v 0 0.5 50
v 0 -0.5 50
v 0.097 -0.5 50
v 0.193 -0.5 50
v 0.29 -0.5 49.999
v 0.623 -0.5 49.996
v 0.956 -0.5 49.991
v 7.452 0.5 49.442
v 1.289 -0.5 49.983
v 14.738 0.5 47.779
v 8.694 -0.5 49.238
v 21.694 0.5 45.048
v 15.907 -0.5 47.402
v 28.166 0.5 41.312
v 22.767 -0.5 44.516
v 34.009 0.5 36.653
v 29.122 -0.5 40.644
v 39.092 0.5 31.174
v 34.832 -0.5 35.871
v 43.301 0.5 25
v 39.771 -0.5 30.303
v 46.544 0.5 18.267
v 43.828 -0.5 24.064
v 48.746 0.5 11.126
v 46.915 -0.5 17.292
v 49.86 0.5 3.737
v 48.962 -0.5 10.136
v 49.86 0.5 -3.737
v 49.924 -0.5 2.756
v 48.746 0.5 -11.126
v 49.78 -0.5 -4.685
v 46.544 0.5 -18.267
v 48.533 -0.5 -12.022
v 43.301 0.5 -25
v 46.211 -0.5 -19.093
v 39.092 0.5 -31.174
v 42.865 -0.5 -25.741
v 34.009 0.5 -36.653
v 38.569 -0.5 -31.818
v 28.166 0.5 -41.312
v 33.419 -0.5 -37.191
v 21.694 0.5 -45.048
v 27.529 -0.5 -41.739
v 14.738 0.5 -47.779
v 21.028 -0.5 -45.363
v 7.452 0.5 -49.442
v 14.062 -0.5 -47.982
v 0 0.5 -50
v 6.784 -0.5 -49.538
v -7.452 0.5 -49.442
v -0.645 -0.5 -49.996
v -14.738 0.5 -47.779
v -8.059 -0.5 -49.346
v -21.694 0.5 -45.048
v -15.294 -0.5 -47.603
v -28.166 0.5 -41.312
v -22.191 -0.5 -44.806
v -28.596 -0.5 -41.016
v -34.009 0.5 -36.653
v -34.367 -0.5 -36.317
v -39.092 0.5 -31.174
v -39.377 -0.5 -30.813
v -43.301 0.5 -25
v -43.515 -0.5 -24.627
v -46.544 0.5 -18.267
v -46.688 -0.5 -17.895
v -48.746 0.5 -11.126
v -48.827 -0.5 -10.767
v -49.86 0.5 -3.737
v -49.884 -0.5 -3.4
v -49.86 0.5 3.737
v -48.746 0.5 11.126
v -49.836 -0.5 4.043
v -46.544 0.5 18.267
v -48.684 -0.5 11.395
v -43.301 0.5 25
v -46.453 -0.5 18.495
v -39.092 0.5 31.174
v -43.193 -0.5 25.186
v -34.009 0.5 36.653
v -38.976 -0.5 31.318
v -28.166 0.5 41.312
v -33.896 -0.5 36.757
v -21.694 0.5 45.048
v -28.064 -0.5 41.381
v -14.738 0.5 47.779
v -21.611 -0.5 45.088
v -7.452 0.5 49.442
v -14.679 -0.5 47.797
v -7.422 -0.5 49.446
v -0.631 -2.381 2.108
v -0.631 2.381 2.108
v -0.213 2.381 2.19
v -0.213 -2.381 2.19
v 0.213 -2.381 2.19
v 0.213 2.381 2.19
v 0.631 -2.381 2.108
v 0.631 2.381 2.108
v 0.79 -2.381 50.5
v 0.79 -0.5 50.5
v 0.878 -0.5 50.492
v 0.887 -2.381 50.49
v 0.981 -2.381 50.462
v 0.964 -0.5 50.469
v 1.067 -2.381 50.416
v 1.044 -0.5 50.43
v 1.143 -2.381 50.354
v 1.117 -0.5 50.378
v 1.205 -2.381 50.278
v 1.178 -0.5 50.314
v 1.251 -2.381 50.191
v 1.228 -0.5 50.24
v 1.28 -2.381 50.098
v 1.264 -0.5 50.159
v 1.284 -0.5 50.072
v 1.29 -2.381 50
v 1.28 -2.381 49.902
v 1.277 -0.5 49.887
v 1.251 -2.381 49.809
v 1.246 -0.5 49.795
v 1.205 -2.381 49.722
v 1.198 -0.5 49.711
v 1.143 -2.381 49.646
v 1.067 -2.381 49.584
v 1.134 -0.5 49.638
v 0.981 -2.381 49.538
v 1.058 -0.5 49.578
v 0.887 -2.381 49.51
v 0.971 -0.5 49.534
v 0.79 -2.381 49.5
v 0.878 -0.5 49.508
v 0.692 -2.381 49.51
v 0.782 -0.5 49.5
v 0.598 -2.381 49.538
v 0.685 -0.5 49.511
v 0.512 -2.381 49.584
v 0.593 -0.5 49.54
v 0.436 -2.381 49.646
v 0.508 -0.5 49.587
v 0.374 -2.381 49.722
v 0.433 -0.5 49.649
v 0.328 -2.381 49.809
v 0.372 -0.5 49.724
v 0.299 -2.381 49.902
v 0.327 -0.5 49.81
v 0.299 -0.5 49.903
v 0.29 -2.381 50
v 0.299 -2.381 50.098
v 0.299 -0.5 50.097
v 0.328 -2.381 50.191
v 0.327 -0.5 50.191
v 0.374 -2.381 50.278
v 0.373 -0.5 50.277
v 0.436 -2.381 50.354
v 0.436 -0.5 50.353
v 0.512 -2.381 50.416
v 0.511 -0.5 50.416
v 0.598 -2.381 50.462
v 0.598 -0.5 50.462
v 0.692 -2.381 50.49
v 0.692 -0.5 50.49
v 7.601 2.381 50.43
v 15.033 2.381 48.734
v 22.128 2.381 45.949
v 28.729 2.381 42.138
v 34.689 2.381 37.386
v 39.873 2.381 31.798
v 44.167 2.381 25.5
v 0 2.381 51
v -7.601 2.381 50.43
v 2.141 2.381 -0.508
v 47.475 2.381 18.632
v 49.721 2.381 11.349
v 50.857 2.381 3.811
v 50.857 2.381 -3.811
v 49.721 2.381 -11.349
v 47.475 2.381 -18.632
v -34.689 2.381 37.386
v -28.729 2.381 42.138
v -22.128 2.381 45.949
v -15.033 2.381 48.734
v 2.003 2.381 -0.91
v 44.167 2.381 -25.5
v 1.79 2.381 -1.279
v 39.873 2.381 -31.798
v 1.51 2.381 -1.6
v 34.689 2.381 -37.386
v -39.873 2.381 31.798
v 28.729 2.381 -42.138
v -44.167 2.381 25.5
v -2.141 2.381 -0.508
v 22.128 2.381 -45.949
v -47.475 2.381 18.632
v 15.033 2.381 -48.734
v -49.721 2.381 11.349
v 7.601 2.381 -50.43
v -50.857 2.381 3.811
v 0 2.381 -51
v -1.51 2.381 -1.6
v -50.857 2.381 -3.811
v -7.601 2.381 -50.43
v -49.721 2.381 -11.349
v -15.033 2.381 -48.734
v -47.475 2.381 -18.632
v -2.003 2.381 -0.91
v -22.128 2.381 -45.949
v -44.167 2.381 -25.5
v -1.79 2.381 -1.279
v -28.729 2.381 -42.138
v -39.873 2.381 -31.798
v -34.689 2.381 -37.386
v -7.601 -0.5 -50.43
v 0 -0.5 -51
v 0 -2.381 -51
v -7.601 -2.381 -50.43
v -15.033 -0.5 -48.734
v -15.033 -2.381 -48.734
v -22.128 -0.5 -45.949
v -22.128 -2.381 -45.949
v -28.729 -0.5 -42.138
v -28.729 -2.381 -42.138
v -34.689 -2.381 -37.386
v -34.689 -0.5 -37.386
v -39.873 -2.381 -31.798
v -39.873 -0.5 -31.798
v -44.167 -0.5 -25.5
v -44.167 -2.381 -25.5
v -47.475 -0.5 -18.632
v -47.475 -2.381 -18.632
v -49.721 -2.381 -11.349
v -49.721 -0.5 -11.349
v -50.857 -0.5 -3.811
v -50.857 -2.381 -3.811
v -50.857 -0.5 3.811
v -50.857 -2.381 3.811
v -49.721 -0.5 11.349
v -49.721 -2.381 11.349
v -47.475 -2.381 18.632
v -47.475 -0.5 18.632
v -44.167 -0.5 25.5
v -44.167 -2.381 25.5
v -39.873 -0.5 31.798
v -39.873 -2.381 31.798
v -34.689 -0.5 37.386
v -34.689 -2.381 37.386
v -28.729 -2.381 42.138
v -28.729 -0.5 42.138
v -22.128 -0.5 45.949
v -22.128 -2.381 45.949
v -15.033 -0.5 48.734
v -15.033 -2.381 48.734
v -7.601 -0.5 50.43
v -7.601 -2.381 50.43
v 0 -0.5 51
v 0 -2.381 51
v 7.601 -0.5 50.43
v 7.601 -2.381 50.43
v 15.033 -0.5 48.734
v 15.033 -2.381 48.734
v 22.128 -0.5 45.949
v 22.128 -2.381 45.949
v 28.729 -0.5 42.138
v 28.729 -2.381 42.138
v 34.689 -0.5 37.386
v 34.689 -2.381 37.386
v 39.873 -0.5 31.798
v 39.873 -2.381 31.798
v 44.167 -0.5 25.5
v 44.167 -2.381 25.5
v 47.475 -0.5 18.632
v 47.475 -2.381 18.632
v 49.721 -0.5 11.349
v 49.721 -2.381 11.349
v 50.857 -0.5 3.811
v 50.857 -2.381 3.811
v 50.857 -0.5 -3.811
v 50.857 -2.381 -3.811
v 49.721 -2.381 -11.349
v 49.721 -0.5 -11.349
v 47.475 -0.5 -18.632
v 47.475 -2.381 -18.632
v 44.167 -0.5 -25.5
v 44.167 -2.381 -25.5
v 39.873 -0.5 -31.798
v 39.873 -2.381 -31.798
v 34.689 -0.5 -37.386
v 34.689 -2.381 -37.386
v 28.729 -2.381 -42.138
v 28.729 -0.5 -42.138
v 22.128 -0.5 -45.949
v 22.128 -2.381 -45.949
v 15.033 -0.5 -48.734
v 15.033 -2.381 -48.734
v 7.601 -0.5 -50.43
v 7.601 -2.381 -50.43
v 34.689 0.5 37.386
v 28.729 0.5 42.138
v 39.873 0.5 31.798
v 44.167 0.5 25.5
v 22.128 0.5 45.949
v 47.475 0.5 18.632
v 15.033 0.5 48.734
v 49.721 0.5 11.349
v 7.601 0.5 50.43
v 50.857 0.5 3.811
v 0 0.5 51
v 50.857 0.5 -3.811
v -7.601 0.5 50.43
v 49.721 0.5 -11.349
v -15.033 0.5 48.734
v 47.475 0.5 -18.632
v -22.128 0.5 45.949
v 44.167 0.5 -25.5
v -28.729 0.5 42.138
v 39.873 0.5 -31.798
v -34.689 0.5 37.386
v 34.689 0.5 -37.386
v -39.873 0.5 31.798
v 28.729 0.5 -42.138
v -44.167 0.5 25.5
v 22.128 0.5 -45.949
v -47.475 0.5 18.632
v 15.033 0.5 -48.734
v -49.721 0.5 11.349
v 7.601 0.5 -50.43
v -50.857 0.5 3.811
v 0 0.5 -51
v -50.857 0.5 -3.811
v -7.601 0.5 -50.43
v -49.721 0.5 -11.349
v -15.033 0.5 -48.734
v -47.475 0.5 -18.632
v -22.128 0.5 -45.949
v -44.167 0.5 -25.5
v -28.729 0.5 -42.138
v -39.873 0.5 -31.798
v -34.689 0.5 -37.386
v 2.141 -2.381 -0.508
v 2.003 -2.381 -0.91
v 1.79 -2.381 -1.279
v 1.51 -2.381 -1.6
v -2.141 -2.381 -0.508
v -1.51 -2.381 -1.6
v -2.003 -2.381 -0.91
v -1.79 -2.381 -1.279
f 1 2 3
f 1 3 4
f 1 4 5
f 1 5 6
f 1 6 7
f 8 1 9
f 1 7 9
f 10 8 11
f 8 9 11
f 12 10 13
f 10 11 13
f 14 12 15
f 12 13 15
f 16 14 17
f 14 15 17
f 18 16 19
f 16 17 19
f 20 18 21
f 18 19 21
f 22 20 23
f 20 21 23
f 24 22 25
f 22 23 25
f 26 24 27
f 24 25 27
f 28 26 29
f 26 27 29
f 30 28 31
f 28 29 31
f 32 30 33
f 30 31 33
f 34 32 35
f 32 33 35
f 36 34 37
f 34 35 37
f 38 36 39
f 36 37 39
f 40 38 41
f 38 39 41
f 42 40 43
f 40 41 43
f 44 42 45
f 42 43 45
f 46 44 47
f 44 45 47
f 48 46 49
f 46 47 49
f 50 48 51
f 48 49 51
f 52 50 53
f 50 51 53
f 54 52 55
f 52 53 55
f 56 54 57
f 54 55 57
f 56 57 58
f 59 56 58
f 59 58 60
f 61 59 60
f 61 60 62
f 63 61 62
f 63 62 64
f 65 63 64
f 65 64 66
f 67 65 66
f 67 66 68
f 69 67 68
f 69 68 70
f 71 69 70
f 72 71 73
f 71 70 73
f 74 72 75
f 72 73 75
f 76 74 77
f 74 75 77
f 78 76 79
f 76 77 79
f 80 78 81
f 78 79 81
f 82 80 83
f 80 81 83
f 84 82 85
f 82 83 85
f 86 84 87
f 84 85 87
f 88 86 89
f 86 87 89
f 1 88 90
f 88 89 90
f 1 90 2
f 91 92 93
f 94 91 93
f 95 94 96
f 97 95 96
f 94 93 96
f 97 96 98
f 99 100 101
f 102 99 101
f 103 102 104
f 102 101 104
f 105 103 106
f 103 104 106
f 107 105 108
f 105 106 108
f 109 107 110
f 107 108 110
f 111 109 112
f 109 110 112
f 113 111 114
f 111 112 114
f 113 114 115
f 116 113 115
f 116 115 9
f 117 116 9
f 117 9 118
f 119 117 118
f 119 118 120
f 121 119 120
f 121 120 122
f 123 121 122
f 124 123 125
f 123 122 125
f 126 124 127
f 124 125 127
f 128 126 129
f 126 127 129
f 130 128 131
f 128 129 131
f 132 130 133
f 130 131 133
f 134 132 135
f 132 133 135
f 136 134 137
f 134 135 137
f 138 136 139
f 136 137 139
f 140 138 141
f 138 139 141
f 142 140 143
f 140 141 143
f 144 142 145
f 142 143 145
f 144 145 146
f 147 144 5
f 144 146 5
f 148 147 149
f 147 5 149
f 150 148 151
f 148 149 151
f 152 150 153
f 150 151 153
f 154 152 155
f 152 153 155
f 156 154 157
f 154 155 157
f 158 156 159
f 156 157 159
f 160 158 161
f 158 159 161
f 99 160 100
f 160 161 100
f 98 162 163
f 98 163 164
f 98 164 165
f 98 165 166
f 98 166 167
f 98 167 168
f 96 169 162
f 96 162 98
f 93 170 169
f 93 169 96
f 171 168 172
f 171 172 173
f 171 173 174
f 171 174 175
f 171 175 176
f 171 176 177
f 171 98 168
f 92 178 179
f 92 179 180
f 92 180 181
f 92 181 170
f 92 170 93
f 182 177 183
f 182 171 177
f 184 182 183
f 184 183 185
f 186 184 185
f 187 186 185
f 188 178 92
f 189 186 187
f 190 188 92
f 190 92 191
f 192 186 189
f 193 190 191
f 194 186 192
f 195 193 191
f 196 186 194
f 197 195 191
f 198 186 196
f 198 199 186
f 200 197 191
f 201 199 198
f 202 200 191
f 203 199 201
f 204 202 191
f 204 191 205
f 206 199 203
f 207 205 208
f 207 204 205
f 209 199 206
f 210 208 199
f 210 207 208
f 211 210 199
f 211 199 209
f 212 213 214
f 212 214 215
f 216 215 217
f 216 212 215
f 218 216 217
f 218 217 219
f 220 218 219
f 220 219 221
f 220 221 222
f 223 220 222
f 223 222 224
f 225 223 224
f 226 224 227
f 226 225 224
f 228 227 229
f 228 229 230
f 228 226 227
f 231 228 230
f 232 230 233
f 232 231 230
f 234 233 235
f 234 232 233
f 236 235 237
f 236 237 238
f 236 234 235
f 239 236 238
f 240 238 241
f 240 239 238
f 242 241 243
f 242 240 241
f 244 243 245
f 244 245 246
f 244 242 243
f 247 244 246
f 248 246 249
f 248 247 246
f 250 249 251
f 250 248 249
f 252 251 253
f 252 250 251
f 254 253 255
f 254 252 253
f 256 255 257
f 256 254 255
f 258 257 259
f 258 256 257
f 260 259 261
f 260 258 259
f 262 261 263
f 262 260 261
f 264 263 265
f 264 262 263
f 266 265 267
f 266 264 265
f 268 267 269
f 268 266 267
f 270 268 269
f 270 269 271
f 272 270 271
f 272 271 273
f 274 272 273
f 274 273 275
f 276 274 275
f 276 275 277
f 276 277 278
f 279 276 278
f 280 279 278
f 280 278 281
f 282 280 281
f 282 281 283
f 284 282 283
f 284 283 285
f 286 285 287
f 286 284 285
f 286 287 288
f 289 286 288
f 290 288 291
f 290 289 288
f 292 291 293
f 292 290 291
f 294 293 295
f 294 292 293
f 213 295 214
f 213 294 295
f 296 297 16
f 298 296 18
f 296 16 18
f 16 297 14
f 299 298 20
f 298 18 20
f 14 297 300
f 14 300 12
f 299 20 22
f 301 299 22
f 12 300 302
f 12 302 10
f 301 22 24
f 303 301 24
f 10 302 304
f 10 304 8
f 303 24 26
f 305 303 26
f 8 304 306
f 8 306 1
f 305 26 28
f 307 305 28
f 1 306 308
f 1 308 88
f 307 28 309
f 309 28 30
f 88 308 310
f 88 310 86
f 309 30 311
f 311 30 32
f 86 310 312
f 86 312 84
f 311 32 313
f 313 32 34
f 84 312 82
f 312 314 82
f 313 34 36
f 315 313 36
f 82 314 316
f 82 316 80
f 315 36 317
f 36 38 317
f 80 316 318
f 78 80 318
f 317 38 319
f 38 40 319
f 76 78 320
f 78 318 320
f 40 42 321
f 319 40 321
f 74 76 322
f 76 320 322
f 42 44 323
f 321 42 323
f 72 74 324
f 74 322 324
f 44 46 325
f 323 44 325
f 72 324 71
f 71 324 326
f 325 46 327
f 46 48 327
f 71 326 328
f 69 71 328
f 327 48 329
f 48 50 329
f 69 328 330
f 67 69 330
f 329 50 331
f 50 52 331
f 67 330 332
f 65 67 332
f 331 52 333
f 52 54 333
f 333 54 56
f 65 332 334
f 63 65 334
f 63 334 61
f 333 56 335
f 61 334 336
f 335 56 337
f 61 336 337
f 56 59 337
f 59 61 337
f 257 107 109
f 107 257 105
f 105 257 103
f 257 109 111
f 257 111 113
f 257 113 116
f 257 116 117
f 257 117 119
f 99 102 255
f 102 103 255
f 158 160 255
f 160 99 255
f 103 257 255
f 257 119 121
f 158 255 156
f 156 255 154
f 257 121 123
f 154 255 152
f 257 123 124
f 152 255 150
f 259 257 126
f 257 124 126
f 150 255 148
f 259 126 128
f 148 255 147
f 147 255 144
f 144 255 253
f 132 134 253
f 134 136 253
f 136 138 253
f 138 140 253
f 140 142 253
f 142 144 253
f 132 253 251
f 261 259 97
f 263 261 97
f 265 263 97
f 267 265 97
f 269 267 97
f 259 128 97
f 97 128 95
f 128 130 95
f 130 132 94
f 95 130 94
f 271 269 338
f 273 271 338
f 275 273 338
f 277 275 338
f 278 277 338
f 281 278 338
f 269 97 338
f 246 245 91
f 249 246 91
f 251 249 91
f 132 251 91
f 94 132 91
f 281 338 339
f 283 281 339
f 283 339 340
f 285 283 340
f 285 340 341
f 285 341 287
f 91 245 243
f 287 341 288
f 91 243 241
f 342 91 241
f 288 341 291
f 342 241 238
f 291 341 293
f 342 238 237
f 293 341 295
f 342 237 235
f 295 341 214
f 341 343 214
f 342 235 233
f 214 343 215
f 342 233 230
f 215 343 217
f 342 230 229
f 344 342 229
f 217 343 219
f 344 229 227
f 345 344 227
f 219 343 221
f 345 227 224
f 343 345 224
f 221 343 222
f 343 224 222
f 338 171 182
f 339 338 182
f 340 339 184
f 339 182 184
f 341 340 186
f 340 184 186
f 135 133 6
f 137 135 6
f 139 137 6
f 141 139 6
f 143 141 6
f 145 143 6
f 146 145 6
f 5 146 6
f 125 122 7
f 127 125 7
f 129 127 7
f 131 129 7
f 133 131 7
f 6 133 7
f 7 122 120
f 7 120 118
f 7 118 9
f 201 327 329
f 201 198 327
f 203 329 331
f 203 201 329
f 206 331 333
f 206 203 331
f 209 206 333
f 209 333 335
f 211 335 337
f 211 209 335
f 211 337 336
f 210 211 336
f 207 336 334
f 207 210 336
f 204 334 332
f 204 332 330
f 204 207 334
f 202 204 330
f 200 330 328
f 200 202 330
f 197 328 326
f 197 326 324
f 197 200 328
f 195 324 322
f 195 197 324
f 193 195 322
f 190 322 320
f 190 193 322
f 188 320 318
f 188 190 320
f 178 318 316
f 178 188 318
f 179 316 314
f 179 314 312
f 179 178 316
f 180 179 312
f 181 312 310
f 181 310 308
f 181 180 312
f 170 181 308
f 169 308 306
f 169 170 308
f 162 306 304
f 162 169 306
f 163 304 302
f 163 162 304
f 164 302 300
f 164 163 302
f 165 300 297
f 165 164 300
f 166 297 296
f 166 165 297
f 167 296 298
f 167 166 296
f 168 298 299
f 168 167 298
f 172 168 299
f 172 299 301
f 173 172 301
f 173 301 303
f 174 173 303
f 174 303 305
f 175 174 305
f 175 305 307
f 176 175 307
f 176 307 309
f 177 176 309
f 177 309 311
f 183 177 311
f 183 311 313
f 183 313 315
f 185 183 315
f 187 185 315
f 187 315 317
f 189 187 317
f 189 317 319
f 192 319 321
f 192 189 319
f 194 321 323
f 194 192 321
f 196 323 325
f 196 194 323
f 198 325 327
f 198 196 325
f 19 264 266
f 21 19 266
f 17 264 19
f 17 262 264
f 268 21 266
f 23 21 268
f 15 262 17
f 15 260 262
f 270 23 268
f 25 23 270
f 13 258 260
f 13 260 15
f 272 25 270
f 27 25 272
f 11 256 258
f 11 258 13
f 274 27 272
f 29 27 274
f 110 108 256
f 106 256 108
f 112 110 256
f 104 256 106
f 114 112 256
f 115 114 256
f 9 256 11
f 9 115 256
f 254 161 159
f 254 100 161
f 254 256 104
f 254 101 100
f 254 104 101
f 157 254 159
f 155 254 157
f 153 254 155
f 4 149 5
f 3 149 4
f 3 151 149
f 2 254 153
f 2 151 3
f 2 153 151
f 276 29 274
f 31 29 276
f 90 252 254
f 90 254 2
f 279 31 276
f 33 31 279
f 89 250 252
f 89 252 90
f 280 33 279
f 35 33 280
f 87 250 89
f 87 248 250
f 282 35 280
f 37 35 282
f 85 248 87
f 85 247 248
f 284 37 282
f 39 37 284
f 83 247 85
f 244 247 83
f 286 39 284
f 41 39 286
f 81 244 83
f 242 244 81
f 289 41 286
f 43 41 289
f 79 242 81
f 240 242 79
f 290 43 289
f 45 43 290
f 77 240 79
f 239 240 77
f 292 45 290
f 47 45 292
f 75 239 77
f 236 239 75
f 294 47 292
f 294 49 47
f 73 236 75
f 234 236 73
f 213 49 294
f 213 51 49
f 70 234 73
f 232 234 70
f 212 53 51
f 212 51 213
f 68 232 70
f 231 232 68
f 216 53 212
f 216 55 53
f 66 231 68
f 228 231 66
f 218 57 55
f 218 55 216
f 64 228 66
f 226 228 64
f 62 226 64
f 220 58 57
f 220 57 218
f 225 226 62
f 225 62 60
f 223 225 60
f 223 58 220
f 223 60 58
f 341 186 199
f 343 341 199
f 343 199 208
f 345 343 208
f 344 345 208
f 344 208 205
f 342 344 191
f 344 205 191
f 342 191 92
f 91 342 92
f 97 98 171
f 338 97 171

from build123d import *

# Parameters (mm, degrees)
ESBO_O1_R                = 51
RESSALTO_EXTRUS_O1_DEPTH = 2.38125
ESBO_O2_R                = 51
ESBO_O2_R_2              = 50
CORTE_EXTRUS_O1_DEPTH    = 0.5
ESBO_O3_R                = 0.5
CORTE_EXTRUS_O2_DEPTH    = 1.88125
CORTE_EXTRUS_O3_DEPTH    = 73.281957681


with BuildPart() as part:
    # Esboço1 → Ressalto-extrusão1 (new, symmetric)
    with BuildSketch(Plane(origin=(0, 0, 0), x_dir=(1, 0, 0), z_dir=(0, 1, 0))):
        with Locations(Location((0, 0, 0), (0, 0, 90))):
            Circle(ESBO_O1_R)
    extrude(amount=RESSALTO_EXTRUS_O1_DEPTH, both=True)

    # Esboço2 → Corte-extrusão1 (cut, symmetric)
    with BuildSketch(Plane(origin=(0, 0, 0), x_dir=(1, 0, 0), z_dir=(0, 1, 0))):
        with Locations(Location((0, 0, 0), (0, 0, 90))):
            Circle(ESBO_O2_R)
        with Locations(Location((0, 0, 0), (0, 0, 270))):
            Circle(ESBO_O2_R_2, mode=Mode.SUBTRACT)
    extrude(amount=CORTE_EXTRUS_O1_DEPTH, both=True, mode=Mode.SUBTRACT)

    # Esboço3 → Corte-extrusão2 (cut)
    with BuildSketch(Plane(origin=(0, -0.5, 0), x_dir=(1, 0, 0), z_dir=(0, 1, 0))):
        with Locations(Location((0.789504293, -50, 0), (0, 0, 270))):
            Circle(ESBO_O3_R)
    extrude(amount=-CORTE_EXTRUS_O2_DEPTH, mode=Mode.SUBTRACT)

    # Esboço4 → Corte-extrusão3 (cut, through all)
    with BuildSketch(Plane(origin=(0, 2.38125, 0), x_dir=(1, 0, 0), z_dir=(0, 1, 0))):
        with BuildLine():
            Line((-2.14062409, 0.507669683), (-0.630657203, -2.107669683))
            ThreePointArc((-0.630657203, -2.107669683), (0, -2.2), (0.630657203, -2.107669683))
            Line((0.630657203, -2.107669683), (2.14062409, 0.507669683))
            ThreePointArc((2.14062409, 0.507669683), (1.905255888, 1.1), (1.509966887, 1.6))
            Line((1.509966887, 1.6), (-1.509966887, 1.6))
            ThreePointArc((-1.509966887, 1.6), (-1.905255888, 1.1), (-2.14062409, 0.507669683))
        make_face()
    extrude(amount=-CORTE_EXTRUS_O3_DEPTH, mode=Mode.SUBTRACT)


solid = part.part
